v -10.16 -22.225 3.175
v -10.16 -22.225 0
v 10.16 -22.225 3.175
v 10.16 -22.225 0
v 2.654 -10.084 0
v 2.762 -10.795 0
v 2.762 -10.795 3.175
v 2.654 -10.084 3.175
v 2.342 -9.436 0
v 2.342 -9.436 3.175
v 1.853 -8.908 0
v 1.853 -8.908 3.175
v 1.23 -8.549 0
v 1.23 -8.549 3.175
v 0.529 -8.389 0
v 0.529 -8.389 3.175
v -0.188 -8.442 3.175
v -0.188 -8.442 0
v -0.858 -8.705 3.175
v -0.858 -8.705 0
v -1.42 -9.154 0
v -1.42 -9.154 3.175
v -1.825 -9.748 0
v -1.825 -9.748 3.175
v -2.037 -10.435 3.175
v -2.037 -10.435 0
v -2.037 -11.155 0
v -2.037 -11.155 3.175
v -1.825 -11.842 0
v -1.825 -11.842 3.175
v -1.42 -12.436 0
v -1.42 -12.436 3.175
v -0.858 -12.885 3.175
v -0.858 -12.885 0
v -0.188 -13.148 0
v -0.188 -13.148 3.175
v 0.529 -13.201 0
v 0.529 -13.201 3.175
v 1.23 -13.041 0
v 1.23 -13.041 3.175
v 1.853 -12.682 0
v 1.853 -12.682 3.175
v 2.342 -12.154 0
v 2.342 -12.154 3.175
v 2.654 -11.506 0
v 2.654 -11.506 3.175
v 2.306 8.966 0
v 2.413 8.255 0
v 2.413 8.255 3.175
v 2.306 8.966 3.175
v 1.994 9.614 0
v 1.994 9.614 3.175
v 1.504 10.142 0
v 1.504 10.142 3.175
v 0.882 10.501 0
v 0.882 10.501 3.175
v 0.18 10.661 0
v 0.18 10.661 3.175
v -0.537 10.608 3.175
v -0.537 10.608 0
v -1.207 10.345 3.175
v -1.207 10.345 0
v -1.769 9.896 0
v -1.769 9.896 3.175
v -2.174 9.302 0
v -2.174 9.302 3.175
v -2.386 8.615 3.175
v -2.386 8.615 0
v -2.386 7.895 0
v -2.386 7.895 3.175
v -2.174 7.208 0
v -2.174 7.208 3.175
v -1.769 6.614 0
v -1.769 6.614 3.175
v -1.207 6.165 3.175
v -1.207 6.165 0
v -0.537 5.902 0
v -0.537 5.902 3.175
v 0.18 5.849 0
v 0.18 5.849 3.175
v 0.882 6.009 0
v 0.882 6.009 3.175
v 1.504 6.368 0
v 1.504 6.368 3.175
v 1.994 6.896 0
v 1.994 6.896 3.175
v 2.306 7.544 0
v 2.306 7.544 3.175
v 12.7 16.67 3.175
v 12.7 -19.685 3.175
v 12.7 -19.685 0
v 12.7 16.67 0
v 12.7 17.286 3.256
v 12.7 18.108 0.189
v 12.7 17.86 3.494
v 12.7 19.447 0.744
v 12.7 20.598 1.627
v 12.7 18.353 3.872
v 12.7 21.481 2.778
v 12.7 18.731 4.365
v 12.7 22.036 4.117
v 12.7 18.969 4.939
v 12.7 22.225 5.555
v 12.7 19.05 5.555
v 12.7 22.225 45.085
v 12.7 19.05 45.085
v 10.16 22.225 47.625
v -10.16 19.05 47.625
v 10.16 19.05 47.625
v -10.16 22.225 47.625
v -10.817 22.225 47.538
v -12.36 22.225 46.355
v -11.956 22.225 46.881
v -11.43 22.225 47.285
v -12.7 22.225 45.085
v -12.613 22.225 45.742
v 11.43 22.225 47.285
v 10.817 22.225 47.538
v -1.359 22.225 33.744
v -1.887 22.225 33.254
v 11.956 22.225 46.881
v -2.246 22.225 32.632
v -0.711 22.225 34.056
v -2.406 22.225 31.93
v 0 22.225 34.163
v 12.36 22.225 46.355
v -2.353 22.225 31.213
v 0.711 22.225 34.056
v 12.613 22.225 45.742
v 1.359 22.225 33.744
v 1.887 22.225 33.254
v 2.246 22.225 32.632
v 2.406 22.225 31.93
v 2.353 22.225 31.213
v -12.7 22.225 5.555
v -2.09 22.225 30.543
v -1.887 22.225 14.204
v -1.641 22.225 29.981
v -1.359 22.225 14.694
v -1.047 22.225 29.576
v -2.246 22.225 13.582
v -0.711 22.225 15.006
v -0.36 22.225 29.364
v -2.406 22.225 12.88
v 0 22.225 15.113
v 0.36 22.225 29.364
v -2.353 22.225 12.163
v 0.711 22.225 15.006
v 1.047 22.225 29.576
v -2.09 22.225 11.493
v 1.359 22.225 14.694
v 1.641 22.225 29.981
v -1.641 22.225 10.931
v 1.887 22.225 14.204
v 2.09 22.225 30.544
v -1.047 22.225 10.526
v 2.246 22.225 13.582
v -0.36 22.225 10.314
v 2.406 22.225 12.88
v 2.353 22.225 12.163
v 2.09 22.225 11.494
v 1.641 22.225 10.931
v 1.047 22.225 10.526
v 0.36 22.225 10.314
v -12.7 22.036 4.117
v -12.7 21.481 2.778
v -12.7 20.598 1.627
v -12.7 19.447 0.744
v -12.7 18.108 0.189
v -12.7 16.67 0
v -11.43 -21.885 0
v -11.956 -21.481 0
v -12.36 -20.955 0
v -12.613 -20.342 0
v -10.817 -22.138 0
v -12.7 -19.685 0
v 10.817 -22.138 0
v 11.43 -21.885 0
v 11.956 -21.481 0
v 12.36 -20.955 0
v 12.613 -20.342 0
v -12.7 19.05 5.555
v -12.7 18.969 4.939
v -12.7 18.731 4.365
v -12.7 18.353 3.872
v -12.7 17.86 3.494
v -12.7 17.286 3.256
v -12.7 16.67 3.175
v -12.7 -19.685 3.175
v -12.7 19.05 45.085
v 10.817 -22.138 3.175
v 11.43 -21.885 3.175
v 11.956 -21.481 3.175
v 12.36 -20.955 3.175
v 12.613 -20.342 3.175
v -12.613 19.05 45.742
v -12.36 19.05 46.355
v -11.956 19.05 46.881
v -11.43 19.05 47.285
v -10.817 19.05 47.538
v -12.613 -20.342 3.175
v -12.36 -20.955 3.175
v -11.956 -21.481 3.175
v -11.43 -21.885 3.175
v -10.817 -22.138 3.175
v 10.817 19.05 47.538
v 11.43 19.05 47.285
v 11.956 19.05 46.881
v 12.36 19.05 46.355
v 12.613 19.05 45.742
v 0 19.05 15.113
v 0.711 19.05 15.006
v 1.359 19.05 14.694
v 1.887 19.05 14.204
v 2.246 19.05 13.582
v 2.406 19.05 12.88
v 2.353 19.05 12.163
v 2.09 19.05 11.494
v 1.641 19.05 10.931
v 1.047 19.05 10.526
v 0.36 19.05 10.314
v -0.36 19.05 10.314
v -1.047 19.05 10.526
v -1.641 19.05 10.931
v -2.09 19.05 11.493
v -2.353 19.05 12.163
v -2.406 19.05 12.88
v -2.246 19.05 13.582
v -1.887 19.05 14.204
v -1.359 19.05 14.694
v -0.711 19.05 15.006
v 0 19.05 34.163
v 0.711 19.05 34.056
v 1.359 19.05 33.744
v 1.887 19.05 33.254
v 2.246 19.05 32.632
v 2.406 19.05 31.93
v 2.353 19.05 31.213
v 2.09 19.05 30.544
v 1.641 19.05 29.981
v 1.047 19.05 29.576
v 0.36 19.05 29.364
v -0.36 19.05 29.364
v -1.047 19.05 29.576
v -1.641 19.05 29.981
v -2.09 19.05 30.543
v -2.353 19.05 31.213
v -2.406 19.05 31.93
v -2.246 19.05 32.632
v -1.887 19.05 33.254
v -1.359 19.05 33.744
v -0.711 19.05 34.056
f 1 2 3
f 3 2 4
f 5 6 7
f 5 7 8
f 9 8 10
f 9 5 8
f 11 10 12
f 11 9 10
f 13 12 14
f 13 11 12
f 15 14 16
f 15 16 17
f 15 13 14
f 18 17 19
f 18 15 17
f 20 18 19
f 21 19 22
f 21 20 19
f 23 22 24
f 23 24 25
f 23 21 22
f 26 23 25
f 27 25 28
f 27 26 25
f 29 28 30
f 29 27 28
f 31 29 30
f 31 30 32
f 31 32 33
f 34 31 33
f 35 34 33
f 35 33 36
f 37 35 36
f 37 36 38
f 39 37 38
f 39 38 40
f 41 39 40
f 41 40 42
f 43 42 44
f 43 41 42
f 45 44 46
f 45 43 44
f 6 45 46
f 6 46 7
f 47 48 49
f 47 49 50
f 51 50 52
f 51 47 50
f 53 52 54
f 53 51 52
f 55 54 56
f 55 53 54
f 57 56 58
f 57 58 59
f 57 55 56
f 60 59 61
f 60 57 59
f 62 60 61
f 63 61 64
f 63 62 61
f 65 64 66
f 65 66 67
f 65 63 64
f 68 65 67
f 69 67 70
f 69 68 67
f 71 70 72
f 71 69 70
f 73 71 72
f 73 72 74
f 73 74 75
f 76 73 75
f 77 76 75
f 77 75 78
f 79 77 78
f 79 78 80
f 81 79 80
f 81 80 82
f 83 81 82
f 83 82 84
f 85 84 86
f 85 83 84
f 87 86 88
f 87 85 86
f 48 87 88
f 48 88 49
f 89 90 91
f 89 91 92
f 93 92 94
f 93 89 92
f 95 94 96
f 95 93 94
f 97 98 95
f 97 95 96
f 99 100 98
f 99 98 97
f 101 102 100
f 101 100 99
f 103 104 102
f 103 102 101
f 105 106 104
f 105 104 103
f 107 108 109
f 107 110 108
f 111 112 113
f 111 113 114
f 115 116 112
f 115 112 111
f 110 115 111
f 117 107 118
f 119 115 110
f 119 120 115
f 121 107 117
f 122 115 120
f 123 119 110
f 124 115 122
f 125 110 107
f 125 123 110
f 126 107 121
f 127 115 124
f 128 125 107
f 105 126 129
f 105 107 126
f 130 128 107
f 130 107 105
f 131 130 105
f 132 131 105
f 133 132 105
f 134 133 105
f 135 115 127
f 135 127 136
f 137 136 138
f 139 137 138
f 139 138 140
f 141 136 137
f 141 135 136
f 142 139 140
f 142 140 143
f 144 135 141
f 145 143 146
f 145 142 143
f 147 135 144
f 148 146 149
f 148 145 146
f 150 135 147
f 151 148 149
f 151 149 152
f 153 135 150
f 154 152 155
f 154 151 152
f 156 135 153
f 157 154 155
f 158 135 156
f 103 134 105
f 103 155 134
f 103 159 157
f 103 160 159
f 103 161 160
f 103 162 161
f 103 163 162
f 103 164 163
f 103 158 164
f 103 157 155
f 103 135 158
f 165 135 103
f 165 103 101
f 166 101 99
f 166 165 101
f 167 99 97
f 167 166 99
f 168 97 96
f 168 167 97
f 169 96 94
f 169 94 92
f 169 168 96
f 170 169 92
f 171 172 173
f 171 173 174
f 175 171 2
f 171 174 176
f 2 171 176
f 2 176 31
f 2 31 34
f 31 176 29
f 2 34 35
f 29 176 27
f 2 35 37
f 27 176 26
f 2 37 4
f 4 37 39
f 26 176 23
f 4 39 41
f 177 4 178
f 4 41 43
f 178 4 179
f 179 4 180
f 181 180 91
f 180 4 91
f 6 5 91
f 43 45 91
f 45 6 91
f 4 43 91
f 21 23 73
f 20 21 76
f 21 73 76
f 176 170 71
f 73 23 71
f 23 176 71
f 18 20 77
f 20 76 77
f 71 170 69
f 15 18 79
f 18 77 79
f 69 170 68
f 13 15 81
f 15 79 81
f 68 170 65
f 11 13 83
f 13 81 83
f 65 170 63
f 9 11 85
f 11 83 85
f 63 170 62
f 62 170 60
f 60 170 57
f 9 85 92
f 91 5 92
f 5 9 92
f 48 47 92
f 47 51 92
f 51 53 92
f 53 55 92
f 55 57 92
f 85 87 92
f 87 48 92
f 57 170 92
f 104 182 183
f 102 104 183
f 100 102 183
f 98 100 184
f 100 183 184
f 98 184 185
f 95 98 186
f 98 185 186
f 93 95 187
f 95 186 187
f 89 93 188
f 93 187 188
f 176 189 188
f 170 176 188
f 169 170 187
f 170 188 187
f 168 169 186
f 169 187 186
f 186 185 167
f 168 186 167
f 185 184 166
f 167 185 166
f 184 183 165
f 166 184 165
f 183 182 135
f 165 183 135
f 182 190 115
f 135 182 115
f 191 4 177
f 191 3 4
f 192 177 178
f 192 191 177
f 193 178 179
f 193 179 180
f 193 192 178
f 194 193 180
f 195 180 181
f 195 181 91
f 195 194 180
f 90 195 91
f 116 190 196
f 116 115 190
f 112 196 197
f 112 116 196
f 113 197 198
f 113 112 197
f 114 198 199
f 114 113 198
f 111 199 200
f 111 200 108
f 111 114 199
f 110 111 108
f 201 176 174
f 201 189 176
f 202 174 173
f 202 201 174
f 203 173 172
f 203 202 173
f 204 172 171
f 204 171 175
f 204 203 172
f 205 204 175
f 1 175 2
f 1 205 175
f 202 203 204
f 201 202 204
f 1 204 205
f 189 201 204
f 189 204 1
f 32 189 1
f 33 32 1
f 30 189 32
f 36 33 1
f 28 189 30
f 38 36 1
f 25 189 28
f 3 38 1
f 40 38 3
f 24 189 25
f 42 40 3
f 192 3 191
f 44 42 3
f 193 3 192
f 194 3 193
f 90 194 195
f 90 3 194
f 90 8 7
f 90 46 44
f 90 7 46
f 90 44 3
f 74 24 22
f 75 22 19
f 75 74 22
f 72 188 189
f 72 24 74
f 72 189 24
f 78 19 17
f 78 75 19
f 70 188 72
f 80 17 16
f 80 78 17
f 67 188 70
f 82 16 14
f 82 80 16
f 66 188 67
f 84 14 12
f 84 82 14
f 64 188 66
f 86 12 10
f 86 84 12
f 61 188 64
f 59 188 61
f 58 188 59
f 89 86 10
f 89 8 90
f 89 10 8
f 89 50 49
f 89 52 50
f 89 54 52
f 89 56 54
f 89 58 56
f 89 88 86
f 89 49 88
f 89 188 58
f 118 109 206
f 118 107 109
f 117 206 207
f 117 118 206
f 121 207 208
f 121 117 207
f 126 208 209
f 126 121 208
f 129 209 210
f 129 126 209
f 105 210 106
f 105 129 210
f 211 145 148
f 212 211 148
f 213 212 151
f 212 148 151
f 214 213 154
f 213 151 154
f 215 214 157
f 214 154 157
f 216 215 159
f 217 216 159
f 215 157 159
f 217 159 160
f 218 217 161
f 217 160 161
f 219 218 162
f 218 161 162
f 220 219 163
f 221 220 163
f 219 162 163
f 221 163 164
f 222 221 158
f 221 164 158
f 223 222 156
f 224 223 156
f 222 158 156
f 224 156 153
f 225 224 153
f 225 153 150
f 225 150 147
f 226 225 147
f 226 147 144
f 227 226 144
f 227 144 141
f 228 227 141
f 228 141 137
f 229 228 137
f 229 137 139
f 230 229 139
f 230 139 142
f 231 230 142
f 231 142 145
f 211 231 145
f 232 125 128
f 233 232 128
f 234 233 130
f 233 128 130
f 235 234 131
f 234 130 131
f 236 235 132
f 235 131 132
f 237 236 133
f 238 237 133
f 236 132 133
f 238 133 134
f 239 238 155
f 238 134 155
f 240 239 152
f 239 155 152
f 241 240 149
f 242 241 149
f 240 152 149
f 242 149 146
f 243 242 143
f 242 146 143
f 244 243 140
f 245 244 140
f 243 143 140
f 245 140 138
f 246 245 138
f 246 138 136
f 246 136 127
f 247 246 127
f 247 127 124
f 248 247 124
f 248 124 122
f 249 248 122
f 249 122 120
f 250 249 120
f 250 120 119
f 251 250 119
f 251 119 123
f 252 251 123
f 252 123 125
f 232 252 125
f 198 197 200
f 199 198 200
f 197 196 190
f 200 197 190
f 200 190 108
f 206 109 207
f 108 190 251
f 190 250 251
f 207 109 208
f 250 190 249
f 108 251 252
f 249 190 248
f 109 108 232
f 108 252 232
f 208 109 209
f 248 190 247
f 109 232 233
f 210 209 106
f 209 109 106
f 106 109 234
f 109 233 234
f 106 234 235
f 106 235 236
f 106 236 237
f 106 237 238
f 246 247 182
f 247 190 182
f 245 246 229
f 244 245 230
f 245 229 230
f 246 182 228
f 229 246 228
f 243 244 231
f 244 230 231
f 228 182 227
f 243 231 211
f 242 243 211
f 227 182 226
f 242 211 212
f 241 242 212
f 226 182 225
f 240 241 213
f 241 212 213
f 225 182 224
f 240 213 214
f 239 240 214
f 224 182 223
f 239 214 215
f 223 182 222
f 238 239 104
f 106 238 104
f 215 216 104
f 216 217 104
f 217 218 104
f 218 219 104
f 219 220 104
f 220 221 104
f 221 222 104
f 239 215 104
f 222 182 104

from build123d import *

# Parameters (mm, degrees)
SKETCH1_W              = 25.4
SKETCH1_H              = 44.45
SKETCH1_R              = 2.413
BOSS_EXTRUDE1_DEPTH    = 3.175
SKETCH2_W              = 25.4
SKETCH2_H              = 3.175
BOSS_EXTRUDE2_DEPTH    = 44.45
SKETCH3_R              = 2.413
CUT_EXTRUDE1_DEPTH     = 44.45
FILLET1_R              = 2.54
CONVERT_SOLID1_START   = -12.7
CONVERT_SOLID1_DEPTH   = 25.4
CONVERT_SOLID1_2_DEPTH = 25.4


# Read off the part's stored shape, not the designer's step: Convert-Solid1
with BuildPart() as part:
    # Sketch1 → Boss-Extrude1 (new body)
    with BuildSketch(Plane.XY):
        Rectangle(SKETCH1_W, SKETCH1_H)
        with Locations((0, 8.255)):
            Circle(SKETCH1_R, mode=Mode.SUBTRACT)
        with Locations((0.348627451, -10.795)):
            Circle(SKETCH1_R, mode=Mode.SUBTRACT)
    extrude(amount=BOSS_EXTRUDE1_DEPTH)

    # Sketch2 → Boss-Extrude2 (add)
    with BuildSketch(Plane.XY.offset(3.175)):
        with Locations((0, 20.6375)):
            Rectangle(SKETCH2_W, SKETCH2_H)
    extrude(amount=BOSS_EXTRUDE2_DEPTH)

    # Sketch3 → Cut-Extrude1 (cut)
    with BuildSketch(Plane(origin=(0, 22.225, 0), x_dir=(1, 0, 0), z_dir=(0, 1, 0))):
        with Locations(Location((0, -12.7, 0), (0, 0, 270))):
            Circle(SKETCH3_R)
        with Locations(Location((0, -31.75, 0), (0, 0, 270))):
            Circle(SKETCH3_R)
    extrude(amount=-CUT_EXTRUDE1_DEPTH, mode=Mode.SUBTRACT)

    # Fillet1
    fillet1_edges = [part.edges().sort_by_distance(p)[0] for p in [
        (-12.7, 20.6375, 47.625),
        (12.7, 20.6375, 47.625),
        (12.7, -22.225, 1.5875),
        (-12.7, -22.225, 1.5875),
    ]]
    fillet(fillet1_edges, radius=FILLET1_R)

    # Convert-Solid1 outline → Convert-Solid1 (cut)
    with BuildSketch(Plane.YZ.offset(CONVERT_SOLID1_START)):
        with BuildLine():
            Line((22.225, 0), (22.225, 5.555000066))
            ThreePointArc((22.225, 5.555000066), (20.59797815, 1.62702185), (16.669999934, 0))
            Line((16.669999934, 0), (22.225, 0))
        make_face()
    extrude(amount=CONVERT_SOLID1_DEPTH, mode=Mode.SUBTRACT)

    # Convert-Solid1 2 outline → Convert-Solid1 2 (add)
    with BuildSketch(Plane.YZ.offset(CONVERT_SOLID1_START)):
        with BuildLine():
            Line((19.05, 3.175), (19.05, 5.555000066))
            ThreePointArc((19.05, 5.555000066), (18.35291412, 3.87208588), (16.669999934, 3.175))
            Line((16.669999934, 3.175), (19.05, 3.175))
        make_face()
    extrude(amount=CONVERT_SOLID1_2_DEPTH)


solid = part.part
